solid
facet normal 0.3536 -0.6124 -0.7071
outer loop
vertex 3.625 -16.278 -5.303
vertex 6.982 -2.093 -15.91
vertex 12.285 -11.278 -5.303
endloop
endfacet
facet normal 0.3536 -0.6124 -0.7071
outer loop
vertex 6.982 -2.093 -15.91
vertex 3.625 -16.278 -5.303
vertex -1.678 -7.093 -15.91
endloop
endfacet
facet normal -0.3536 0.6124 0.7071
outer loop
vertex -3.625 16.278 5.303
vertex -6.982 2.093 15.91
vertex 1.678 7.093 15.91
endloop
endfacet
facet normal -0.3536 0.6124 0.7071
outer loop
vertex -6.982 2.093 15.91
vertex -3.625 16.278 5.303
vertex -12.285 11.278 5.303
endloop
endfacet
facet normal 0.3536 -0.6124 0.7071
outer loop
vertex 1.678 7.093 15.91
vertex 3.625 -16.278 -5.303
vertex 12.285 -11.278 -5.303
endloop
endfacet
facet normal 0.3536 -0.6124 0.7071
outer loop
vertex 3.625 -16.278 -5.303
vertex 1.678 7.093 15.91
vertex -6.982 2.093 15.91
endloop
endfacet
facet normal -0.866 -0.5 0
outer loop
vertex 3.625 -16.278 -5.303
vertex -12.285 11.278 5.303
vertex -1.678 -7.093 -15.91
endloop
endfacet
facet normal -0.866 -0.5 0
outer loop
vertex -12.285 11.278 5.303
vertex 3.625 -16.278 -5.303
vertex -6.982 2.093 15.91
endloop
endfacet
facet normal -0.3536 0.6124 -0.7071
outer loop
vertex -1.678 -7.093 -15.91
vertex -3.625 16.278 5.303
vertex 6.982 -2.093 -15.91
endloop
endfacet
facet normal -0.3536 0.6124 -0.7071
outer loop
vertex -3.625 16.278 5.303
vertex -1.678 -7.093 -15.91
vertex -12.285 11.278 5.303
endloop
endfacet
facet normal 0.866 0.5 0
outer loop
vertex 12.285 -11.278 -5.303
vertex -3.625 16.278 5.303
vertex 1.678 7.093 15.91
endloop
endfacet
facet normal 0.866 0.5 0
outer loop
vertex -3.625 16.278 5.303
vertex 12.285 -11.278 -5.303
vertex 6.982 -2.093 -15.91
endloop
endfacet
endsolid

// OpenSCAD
// Generated by generate_scads.py
rotate([45,180,30]) {
  cube(size=[10,15,30], center=true);
}
